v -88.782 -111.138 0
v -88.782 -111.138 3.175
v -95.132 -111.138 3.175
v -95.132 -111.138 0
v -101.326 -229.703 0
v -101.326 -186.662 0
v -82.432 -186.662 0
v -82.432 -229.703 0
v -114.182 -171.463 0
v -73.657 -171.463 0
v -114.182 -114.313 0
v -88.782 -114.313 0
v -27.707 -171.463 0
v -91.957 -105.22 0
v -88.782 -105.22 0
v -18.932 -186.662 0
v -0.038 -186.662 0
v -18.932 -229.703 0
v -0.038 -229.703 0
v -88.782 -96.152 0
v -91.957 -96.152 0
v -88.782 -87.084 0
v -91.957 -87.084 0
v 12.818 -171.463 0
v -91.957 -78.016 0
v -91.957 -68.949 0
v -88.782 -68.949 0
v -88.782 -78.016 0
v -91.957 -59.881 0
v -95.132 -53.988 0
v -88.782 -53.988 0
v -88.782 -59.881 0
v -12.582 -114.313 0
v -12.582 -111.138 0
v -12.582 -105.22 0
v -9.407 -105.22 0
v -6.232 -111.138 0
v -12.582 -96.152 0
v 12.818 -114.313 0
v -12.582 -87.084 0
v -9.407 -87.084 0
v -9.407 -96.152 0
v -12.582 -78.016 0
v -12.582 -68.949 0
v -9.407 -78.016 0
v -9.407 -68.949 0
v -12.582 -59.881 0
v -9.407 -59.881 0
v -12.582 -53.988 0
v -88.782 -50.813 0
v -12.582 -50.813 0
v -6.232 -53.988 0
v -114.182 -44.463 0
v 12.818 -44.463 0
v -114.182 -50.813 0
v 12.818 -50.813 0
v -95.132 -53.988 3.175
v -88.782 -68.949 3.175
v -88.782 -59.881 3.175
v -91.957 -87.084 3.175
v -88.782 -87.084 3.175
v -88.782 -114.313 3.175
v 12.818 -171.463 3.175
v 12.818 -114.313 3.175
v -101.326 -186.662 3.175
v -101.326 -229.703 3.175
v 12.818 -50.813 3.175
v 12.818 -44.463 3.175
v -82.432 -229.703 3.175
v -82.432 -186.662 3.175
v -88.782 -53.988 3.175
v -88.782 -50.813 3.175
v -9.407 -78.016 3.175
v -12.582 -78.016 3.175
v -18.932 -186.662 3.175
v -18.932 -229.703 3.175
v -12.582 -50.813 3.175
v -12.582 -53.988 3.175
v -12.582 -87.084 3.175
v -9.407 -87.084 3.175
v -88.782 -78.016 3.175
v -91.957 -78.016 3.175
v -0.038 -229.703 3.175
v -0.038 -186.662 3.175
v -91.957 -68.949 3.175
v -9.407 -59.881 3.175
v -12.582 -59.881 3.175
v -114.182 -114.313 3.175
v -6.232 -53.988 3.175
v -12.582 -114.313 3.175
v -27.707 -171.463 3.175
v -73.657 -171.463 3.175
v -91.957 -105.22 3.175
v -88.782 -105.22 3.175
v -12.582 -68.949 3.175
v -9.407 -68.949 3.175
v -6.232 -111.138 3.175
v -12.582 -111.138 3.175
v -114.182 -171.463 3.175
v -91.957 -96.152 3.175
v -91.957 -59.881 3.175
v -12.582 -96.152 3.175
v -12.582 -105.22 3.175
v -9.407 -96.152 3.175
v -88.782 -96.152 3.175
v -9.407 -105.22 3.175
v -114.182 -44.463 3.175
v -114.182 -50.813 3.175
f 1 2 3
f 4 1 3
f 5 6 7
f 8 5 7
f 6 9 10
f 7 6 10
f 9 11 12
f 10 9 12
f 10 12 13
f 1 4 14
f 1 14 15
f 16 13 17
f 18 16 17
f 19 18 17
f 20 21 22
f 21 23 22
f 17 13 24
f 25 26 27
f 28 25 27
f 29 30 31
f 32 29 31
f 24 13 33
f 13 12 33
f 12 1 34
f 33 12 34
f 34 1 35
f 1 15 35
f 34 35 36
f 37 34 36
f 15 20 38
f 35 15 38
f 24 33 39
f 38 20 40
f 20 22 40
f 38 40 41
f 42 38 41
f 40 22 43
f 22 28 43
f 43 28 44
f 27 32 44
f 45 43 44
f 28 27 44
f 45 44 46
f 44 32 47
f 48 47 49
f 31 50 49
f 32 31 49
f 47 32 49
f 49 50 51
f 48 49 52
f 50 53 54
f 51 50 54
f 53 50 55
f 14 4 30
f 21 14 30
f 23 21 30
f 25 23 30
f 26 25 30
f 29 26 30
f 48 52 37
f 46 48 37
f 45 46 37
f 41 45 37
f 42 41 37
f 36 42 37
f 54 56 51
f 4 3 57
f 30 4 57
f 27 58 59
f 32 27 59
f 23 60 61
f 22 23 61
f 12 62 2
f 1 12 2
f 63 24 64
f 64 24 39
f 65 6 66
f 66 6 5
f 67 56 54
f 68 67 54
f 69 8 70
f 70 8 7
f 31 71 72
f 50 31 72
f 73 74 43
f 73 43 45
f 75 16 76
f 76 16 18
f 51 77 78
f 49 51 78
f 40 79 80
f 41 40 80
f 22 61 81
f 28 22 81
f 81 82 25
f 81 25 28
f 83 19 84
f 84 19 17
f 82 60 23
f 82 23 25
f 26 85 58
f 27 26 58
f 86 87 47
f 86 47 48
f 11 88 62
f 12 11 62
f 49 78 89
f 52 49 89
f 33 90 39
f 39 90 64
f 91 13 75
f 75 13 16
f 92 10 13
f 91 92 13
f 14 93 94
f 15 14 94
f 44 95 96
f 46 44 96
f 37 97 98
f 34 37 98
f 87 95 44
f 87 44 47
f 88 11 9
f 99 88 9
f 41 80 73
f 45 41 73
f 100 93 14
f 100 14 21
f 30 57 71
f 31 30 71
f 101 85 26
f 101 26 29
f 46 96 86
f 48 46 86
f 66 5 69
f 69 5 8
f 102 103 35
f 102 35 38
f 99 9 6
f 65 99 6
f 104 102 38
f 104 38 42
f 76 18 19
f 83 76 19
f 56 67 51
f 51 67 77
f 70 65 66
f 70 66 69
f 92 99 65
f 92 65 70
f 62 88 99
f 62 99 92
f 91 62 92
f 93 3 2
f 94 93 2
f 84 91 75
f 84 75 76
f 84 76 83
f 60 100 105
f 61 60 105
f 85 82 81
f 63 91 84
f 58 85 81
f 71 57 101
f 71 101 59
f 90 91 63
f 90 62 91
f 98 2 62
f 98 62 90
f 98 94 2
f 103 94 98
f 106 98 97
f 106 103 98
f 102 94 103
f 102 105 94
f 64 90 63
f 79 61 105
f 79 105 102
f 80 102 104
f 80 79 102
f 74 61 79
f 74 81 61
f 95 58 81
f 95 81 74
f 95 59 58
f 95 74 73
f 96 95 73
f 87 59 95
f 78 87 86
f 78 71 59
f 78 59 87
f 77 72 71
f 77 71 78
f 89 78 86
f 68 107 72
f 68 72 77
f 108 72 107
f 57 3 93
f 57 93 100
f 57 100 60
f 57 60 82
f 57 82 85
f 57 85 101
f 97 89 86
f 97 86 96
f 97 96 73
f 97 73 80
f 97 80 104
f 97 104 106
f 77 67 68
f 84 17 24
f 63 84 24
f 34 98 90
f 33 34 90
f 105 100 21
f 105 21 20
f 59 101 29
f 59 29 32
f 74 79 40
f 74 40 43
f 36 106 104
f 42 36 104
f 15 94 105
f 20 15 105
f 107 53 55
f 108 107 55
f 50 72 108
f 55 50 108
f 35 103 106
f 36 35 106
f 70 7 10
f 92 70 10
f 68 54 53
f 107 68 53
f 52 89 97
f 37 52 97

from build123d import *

# Parameters (mm, degrees)
F1_DEPTH = 3.175
F3_W     = 3.175
F3_H     = 9.0678
F4_DEPTH = 25.4
F6_DEPTH = 25.4


with BuildPart() as f1:
    # F0 (on Top) → F1 (new body)
    with BuildSketch(Plane.XY):
        Polygon((-50.681875, -44.462932), (-114.181875, -44.462932), (-114.181875, -171.462932), (-101.325941, -186.661884), (-101.325941, -229.702711), (-82.431875, -229.702711), (-82.431875, -186.661884), (-73.656756, -171.462932), (-50.681875, -171.462932), align=None)
        Polygon((12.818125, -44.462932), (-50.681875, -44.462932), (-50.681875, -171.462932), (-27.706994, -171.462932), (-18.931875, -186.661884), (-18.931875, -229.702711), (-0.03781, -229.702711), (-0.03781, -186.661884), (12.818125, -171.462932), align=None)
    extrude(amount=F1_DEPTH)

    # F3 (on face) → F4 (cut)
    with BuildSketch(Plane.XY.offset(3.175)):
        with Locations((-110.054375, -64.414632)):
            Rectangle(F3_W, F3_H)
        with Locations((-110.054375, -82.550232)):
            Rectangle(F3_W, F3_H)
        with Locations((-110.054375, -100.685832)):
            Rectangle(F3_W, F3_H)
        with Locations((-90.369375, -64.414632)):
            Rectangle(F3_W, F3_H)
        with Locations((-90.369375, -82.550232)):
            Rectangle(F3_W, F3_H)
        with Locations((-90.369375, -100.685832)):
            Rectangle(F3_W, F3_H)
        with Locations((-10.994375, -82.550232)):
            Rectangle(F3_W, F3_H)
        with Locations((-10.994375, -64.414632)):
            Rectangle(F3_W, F3_H)
        with Locations((8.690625, -100.685832)):
            Rectangle(F3_W, F3_H)
        with Locations((8.690625, -82.550232)):
            Rectangle(F3_W, F3_H)
        with Locations((-10.994375, -100.685832)):
            Rectangle(F3_W, F3_H)
        with Locations((8.690625, -64.414632)):
            Rectangle(F3_W, F3_H)
    extrude(amount=-F4_DEPTH, mode=Mode.SUBTRACT)

    # F5 (on face) → F6 (cut)
    with BuildSketch(Plane.XY.offset(3.175)):
        Polygon((-95.131875, -50.812932), (-114.181875, -50.812932), (-114.181875, -114.312932), (-95.131875, -114.312932), (-88.781875, -114.312932), (-88.781875, -111.137932), (-95.131875, -111.137932), (-95.131875, -53.987932), (-88.781875, -53.987932), (-88.781875, -50.812932), align=None)
        Polygon((-12.581875, -111.137932), (-12.581875, -114.312932), (-6.231875, -114.312932), (12.818125, -114.312932), (12.818125, -50.812932), (-6.231875, -50.812932), (-12.581875, -50.812932), (-12.581875, -53.987932), (-6.231875, -53.987932), (-6.231875, -111.137932), align=None)
    extrude(amount=-F6_DEPTH, mode=Mode.SUBTRACT)


solid = f1.part
